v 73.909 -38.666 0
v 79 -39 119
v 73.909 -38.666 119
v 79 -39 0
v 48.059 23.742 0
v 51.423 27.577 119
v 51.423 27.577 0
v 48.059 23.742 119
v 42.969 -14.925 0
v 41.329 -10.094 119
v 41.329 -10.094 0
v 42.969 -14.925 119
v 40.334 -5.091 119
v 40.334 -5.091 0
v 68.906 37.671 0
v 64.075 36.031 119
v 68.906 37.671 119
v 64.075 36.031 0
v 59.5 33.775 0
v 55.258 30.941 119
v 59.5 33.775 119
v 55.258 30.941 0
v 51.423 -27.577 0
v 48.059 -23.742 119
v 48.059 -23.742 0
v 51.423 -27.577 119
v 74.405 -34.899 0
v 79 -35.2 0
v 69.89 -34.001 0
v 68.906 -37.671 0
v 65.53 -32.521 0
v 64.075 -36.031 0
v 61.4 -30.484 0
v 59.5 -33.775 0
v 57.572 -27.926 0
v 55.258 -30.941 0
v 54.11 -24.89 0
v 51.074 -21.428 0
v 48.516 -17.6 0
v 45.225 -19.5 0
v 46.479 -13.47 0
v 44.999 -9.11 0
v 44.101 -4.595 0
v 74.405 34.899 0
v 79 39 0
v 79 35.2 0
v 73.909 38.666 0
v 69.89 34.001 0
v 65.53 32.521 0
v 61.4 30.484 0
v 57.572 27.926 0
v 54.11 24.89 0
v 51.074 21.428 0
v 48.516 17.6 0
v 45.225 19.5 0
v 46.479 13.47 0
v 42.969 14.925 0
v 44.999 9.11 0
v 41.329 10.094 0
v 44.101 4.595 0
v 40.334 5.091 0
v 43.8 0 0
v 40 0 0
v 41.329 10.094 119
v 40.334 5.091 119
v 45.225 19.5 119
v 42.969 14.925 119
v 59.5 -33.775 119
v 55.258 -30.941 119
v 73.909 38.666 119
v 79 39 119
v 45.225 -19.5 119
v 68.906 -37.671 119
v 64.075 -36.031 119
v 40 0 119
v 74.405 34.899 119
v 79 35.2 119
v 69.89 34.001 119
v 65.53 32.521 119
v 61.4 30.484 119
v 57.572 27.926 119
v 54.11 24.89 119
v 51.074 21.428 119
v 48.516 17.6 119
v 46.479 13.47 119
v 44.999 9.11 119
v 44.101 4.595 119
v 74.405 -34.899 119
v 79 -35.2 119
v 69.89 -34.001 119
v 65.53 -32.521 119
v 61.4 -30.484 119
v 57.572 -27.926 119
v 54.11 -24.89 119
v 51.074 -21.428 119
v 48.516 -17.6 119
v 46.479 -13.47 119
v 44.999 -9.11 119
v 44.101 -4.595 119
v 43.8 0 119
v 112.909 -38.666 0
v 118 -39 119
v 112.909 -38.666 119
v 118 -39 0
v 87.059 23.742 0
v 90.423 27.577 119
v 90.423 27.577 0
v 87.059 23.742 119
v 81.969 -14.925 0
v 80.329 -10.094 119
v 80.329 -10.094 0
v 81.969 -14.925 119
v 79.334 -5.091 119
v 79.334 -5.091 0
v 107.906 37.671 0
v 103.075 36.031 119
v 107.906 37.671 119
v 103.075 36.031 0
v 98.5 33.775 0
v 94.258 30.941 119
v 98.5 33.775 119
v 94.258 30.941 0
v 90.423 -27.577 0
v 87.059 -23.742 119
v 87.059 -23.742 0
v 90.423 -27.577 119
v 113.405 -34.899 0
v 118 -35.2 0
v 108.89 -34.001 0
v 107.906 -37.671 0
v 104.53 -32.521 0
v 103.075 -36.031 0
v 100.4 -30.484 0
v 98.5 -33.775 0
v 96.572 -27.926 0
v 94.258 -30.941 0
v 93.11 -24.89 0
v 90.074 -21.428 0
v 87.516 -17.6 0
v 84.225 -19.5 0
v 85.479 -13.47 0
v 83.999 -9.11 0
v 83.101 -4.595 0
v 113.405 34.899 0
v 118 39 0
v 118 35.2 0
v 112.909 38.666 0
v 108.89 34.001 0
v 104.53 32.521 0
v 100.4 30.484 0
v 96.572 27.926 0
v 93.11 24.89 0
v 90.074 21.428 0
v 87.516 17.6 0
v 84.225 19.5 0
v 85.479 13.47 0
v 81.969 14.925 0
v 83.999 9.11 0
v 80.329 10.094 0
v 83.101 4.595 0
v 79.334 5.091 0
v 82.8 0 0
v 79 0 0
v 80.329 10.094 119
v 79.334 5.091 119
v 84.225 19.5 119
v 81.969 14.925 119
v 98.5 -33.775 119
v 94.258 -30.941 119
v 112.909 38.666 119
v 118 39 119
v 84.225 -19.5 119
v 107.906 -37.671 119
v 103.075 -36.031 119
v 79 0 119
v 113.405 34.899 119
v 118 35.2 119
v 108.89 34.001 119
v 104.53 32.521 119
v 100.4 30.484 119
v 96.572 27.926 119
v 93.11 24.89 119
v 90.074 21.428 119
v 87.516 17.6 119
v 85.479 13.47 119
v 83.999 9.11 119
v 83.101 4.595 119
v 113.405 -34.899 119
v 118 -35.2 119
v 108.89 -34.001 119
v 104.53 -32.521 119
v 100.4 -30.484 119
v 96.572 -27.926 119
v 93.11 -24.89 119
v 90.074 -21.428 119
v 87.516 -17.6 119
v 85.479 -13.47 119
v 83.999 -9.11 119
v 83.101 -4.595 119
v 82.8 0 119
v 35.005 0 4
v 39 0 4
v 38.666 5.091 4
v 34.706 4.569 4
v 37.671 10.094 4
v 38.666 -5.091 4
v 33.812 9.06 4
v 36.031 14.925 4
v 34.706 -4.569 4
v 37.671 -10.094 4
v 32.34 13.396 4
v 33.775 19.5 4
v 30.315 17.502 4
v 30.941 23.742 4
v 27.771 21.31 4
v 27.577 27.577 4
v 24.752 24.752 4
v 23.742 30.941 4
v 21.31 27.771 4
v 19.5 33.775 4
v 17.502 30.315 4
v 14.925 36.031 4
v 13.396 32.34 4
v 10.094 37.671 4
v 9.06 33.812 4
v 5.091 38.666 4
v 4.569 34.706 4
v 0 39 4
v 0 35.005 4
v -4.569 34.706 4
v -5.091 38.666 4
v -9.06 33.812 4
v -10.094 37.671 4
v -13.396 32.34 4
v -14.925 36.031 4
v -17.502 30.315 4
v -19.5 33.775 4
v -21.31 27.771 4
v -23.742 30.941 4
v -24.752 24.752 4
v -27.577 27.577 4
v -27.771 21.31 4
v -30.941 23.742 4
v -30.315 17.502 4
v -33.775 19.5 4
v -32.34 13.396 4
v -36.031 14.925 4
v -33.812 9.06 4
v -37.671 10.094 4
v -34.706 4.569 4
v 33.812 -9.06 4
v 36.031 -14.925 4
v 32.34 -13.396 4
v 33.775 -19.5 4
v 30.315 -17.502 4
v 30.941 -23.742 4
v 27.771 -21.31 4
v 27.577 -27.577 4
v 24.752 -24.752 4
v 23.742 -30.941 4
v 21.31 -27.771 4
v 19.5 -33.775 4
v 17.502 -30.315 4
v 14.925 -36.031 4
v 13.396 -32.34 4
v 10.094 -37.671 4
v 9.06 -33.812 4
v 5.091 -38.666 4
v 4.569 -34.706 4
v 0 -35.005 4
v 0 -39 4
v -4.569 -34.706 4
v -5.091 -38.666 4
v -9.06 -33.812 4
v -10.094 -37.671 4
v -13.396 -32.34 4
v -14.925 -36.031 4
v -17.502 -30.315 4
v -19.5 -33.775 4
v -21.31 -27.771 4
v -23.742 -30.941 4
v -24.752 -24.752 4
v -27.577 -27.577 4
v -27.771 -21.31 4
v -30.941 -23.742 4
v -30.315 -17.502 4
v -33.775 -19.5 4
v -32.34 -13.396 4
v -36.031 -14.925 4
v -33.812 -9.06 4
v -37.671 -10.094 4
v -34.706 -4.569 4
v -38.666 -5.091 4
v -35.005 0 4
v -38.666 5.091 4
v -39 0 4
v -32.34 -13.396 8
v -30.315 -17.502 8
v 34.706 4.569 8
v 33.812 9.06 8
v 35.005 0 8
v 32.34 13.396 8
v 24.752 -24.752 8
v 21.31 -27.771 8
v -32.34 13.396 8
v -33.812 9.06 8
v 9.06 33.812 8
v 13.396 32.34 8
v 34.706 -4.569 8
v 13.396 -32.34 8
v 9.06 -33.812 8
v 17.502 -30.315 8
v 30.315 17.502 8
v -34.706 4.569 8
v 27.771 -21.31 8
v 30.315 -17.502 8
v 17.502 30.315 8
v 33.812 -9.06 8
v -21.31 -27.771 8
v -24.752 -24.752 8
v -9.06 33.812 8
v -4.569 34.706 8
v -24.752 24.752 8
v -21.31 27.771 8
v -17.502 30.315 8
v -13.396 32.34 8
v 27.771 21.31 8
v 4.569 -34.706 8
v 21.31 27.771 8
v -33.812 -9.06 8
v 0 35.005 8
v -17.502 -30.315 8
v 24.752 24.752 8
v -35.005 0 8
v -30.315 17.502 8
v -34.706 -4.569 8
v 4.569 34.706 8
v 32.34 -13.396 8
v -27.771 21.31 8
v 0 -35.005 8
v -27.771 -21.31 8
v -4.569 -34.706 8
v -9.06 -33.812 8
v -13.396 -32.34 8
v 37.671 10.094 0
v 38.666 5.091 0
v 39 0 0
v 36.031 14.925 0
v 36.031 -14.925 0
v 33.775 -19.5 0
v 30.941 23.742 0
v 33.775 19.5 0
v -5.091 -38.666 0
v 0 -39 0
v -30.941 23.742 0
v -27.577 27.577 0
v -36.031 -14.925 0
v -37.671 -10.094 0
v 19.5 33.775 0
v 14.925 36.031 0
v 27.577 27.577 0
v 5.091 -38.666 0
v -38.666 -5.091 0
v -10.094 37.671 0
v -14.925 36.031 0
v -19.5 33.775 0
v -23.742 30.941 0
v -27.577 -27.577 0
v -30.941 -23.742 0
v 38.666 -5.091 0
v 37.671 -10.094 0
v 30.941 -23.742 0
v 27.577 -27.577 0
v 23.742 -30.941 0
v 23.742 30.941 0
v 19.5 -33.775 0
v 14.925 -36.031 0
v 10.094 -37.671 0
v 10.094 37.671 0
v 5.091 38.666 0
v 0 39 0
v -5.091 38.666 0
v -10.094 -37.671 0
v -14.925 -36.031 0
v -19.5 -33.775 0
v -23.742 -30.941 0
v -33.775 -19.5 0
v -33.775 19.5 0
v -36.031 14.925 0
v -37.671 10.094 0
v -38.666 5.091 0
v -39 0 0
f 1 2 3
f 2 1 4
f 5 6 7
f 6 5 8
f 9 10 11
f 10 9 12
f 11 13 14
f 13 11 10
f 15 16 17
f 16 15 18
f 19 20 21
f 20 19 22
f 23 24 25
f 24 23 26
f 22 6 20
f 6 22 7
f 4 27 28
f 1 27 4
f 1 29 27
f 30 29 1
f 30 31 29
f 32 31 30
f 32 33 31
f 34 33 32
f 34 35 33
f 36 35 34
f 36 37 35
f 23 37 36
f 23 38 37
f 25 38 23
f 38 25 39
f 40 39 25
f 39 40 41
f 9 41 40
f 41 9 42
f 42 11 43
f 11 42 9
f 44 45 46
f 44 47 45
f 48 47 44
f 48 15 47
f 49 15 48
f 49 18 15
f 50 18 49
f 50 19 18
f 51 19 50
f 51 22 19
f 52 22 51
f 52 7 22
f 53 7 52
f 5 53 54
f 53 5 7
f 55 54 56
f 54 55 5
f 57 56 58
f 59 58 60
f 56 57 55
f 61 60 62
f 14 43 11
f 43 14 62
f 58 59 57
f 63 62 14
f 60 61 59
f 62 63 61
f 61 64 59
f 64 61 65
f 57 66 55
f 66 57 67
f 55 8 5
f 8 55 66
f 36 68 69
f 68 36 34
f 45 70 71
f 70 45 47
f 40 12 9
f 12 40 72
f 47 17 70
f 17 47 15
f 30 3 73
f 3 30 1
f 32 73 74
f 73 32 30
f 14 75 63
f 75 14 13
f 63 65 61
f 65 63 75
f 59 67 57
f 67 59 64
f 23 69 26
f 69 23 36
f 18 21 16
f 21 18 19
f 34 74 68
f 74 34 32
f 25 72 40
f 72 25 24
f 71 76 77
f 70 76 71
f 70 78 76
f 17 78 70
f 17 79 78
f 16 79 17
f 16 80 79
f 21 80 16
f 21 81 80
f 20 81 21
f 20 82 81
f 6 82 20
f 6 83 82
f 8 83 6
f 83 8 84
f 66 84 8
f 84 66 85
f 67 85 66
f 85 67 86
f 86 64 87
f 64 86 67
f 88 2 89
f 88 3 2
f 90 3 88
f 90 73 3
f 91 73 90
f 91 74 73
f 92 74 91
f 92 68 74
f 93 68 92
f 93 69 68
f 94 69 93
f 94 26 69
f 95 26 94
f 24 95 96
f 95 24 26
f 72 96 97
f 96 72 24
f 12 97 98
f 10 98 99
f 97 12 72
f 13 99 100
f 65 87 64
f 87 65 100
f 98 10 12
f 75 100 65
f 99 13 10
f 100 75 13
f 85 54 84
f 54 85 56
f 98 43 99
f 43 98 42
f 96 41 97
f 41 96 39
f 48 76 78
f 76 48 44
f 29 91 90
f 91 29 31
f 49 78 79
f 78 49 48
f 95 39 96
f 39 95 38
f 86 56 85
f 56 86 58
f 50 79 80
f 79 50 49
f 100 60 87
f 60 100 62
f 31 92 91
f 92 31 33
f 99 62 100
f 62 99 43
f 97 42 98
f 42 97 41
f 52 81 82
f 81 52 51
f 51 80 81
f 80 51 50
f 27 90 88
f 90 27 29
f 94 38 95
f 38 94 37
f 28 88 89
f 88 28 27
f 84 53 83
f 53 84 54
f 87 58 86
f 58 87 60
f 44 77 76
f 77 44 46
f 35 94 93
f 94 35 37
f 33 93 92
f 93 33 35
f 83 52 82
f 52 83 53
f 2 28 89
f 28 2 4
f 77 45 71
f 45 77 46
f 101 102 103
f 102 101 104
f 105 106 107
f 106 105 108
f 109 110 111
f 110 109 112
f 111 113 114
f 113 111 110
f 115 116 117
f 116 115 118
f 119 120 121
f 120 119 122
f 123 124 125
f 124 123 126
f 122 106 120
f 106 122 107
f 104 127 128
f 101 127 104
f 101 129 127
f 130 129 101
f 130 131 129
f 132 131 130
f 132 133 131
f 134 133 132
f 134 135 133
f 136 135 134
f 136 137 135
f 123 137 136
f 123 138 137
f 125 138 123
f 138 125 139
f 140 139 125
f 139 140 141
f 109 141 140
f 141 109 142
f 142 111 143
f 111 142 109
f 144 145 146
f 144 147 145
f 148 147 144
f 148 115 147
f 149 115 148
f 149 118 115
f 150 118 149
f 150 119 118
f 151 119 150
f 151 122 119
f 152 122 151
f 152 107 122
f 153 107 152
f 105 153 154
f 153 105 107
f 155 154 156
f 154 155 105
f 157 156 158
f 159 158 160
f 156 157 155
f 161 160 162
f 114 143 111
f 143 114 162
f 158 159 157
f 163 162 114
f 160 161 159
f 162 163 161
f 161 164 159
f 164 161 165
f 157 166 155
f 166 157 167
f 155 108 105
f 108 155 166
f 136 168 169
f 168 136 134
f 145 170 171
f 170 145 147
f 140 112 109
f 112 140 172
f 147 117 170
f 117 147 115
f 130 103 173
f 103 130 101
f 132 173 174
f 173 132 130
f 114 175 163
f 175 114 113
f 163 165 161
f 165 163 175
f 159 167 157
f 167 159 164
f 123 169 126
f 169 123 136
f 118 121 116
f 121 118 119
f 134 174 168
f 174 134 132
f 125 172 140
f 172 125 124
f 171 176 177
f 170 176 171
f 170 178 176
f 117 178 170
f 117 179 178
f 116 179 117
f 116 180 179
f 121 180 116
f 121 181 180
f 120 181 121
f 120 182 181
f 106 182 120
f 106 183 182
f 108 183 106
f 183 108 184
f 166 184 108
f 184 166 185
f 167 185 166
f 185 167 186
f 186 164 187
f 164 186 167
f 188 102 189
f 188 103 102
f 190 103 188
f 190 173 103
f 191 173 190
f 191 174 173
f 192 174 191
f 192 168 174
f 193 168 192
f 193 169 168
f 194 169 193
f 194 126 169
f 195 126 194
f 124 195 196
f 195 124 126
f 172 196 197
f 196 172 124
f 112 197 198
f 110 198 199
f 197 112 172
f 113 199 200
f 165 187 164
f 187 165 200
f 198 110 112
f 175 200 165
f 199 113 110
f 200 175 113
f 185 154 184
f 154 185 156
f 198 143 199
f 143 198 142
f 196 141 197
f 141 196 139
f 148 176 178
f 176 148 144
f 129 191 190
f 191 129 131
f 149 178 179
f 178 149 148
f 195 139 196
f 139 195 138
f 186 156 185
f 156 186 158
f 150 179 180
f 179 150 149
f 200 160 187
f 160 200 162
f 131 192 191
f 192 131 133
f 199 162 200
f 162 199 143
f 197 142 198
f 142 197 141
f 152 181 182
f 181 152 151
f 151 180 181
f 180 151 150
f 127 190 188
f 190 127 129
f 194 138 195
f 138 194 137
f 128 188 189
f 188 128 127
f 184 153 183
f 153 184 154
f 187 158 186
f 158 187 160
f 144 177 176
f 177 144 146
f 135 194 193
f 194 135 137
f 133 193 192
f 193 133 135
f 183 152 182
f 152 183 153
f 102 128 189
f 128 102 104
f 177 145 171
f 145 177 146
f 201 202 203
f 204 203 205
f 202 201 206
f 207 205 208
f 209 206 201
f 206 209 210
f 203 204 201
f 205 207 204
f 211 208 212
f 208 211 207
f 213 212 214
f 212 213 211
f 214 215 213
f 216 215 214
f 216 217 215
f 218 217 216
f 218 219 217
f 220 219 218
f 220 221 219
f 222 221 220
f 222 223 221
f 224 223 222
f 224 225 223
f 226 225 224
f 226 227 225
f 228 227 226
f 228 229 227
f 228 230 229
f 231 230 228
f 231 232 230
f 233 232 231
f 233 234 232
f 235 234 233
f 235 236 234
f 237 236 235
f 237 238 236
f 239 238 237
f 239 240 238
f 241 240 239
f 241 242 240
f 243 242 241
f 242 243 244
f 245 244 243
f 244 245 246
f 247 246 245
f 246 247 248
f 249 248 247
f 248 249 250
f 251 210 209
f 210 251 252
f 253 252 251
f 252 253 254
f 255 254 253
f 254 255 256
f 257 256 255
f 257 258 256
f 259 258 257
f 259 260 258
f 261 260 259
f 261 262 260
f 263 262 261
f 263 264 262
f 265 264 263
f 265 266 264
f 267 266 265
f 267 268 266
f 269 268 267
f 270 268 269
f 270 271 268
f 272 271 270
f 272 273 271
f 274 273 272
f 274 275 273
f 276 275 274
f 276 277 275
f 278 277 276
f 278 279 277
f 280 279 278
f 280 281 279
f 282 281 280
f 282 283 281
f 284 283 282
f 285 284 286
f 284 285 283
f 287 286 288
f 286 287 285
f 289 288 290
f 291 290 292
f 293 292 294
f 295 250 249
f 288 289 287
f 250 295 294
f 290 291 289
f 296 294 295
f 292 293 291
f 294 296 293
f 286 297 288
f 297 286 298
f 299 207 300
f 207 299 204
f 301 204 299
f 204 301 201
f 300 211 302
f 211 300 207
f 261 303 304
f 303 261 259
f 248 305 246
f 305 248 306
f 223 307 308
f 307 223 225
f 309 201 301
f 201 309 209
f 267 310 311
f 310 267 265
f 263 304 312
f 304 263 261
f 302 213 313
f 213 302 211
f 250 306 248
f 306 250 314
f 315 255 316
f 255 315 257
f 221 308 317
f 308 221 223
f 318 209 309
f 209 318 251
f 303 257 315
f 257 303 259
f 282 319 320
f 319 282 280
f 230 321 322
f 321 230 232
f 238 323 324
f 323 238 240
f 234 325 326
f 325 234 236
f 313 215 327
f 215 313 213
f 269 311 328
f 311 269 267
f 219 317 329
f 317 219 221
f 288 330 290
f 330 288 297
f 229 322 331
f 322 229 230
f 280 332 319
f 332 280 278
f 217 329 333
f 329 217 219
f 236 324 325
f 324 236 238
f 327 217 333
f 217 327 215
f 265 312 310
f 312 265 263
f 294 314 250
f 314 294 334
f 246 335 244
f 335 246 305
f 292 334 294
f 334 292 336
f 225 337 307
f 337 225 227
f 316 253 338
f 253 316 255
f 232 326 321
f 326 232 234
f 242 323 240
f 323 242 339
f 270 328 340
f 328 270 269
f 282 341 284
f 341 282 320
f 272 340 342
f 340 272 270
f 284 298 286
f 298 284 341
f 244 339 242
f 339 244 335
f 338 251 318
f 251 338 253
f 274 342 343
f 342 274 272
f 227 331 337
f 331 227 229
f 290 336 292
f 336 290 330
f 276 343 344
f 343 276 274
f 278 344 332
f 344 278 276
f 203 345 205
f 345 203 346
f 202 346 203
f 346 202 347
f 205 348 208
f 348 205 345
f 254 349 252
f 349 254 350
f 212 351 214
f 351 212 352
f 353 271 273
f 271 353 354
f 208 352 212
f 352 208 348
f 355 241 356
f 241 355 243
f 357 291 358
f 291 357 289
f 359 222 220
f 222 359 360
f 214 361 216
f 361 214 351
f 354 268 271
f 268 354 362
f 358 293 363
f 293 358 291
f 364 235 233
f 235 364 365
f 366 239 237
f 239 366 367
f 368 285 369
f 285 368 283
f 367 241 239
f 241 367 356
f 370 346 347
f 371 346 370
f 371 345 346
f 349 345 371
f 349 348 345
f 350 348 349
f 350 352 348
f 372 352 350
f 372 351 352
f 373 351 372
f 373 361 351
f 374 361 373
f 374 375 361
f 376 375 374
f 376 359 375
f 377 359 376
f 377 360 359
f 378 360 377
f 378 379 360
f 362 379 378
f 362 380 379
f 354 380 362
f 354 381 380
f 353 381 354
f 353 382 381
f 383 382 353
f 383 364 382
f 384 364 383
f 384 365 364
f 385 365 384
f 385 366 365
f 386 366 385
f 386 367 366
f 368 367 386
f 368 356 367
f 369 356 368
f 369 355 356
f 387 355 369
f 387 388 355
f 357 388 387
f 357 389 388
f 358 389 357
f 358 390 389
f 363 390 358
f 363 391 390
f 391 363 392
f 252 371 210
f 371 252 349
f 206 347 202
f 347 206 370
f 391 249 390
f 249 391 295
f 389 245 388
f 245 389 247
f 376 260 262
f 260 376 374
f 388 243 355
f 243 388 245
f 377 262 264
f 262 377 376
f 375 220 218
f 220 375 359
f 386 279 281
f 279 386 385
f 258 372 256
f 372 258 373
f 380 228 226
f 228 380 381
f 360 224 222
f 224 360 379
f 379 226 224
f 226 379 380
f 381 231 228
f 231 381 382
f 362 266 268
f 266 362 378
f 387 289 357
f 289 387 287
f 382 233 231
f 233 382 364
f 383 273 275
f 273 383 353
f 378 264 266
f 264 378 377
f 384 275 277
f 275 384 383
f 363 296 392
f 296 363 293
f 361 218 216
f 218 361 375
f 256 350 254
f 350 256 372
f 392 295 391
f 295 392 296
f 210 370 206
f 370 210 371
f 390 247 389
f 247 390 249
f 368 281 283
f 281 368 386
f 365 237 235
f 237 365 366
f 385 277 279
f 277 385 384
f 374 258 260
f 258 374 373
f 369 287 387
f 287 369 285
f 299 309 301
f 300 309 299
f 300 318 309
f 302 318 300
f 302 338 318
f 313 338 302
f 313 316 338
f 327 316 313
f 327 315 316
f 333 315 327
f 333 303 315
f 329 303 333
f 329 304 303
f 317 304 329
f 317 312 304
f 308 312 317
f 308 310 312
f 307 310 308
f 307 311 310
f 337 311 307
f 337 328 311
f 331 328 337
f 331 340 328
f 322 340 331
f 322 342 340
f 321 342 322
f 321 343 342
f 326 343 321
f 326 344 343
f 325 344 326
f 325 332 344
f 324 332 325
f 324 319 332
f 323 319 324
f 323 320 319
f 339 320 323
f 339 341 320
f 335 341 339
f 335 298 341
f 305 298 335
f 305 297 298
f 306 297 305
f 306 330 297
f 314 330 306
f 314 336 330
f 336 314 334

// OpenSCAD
// The inner diameter of the mold, in mm
innerDiameter = 70;

// The thickness of the walls, in mm;
wallThickness = 4;

// The interior height, in mm
height = 115;

// The amount of extra space between parts to allow a good fit, in mm
allowance = 0.4;

outerDiameter = innerDiameter + wallThickness * 2;

module wall() {
  difference() {
    difference() {
      cylinder($fn=48, d = outerDiameter, h = height + wallThickness);
      translate([0, 0, -0.01])
	cylinder($fn=48, d = innerDiameter + allowance, h = height + wallThickness + 0.02);
    }
    translate([0, -innerDiameter, -0.01]) {
      cube([innerDiameter * 2, innerDiameter * 2, height * 2]);
    }
  }
}

module base() {
  difference() {
    cylinder($fn=48, d = outerDiameter, h = wallThickness * 2);
    translate([0,0,wallThickness]) {
      difference() {
	cylinder($fn=48, d = outerDiameter+0.01, h = wallThickness+0.01);
	cylinder($fn=48, d = innerDiameter+0.01, h = wallThickness+0.01);
      }
    }
  }
}

union() {
  translate([outerDiameter + 1, 0, 0])
    wall();
  translate([outerDiameter * 1.5 + 1, 0, 0])
    wall();
  color([0, 0, 1])
    base();
}
